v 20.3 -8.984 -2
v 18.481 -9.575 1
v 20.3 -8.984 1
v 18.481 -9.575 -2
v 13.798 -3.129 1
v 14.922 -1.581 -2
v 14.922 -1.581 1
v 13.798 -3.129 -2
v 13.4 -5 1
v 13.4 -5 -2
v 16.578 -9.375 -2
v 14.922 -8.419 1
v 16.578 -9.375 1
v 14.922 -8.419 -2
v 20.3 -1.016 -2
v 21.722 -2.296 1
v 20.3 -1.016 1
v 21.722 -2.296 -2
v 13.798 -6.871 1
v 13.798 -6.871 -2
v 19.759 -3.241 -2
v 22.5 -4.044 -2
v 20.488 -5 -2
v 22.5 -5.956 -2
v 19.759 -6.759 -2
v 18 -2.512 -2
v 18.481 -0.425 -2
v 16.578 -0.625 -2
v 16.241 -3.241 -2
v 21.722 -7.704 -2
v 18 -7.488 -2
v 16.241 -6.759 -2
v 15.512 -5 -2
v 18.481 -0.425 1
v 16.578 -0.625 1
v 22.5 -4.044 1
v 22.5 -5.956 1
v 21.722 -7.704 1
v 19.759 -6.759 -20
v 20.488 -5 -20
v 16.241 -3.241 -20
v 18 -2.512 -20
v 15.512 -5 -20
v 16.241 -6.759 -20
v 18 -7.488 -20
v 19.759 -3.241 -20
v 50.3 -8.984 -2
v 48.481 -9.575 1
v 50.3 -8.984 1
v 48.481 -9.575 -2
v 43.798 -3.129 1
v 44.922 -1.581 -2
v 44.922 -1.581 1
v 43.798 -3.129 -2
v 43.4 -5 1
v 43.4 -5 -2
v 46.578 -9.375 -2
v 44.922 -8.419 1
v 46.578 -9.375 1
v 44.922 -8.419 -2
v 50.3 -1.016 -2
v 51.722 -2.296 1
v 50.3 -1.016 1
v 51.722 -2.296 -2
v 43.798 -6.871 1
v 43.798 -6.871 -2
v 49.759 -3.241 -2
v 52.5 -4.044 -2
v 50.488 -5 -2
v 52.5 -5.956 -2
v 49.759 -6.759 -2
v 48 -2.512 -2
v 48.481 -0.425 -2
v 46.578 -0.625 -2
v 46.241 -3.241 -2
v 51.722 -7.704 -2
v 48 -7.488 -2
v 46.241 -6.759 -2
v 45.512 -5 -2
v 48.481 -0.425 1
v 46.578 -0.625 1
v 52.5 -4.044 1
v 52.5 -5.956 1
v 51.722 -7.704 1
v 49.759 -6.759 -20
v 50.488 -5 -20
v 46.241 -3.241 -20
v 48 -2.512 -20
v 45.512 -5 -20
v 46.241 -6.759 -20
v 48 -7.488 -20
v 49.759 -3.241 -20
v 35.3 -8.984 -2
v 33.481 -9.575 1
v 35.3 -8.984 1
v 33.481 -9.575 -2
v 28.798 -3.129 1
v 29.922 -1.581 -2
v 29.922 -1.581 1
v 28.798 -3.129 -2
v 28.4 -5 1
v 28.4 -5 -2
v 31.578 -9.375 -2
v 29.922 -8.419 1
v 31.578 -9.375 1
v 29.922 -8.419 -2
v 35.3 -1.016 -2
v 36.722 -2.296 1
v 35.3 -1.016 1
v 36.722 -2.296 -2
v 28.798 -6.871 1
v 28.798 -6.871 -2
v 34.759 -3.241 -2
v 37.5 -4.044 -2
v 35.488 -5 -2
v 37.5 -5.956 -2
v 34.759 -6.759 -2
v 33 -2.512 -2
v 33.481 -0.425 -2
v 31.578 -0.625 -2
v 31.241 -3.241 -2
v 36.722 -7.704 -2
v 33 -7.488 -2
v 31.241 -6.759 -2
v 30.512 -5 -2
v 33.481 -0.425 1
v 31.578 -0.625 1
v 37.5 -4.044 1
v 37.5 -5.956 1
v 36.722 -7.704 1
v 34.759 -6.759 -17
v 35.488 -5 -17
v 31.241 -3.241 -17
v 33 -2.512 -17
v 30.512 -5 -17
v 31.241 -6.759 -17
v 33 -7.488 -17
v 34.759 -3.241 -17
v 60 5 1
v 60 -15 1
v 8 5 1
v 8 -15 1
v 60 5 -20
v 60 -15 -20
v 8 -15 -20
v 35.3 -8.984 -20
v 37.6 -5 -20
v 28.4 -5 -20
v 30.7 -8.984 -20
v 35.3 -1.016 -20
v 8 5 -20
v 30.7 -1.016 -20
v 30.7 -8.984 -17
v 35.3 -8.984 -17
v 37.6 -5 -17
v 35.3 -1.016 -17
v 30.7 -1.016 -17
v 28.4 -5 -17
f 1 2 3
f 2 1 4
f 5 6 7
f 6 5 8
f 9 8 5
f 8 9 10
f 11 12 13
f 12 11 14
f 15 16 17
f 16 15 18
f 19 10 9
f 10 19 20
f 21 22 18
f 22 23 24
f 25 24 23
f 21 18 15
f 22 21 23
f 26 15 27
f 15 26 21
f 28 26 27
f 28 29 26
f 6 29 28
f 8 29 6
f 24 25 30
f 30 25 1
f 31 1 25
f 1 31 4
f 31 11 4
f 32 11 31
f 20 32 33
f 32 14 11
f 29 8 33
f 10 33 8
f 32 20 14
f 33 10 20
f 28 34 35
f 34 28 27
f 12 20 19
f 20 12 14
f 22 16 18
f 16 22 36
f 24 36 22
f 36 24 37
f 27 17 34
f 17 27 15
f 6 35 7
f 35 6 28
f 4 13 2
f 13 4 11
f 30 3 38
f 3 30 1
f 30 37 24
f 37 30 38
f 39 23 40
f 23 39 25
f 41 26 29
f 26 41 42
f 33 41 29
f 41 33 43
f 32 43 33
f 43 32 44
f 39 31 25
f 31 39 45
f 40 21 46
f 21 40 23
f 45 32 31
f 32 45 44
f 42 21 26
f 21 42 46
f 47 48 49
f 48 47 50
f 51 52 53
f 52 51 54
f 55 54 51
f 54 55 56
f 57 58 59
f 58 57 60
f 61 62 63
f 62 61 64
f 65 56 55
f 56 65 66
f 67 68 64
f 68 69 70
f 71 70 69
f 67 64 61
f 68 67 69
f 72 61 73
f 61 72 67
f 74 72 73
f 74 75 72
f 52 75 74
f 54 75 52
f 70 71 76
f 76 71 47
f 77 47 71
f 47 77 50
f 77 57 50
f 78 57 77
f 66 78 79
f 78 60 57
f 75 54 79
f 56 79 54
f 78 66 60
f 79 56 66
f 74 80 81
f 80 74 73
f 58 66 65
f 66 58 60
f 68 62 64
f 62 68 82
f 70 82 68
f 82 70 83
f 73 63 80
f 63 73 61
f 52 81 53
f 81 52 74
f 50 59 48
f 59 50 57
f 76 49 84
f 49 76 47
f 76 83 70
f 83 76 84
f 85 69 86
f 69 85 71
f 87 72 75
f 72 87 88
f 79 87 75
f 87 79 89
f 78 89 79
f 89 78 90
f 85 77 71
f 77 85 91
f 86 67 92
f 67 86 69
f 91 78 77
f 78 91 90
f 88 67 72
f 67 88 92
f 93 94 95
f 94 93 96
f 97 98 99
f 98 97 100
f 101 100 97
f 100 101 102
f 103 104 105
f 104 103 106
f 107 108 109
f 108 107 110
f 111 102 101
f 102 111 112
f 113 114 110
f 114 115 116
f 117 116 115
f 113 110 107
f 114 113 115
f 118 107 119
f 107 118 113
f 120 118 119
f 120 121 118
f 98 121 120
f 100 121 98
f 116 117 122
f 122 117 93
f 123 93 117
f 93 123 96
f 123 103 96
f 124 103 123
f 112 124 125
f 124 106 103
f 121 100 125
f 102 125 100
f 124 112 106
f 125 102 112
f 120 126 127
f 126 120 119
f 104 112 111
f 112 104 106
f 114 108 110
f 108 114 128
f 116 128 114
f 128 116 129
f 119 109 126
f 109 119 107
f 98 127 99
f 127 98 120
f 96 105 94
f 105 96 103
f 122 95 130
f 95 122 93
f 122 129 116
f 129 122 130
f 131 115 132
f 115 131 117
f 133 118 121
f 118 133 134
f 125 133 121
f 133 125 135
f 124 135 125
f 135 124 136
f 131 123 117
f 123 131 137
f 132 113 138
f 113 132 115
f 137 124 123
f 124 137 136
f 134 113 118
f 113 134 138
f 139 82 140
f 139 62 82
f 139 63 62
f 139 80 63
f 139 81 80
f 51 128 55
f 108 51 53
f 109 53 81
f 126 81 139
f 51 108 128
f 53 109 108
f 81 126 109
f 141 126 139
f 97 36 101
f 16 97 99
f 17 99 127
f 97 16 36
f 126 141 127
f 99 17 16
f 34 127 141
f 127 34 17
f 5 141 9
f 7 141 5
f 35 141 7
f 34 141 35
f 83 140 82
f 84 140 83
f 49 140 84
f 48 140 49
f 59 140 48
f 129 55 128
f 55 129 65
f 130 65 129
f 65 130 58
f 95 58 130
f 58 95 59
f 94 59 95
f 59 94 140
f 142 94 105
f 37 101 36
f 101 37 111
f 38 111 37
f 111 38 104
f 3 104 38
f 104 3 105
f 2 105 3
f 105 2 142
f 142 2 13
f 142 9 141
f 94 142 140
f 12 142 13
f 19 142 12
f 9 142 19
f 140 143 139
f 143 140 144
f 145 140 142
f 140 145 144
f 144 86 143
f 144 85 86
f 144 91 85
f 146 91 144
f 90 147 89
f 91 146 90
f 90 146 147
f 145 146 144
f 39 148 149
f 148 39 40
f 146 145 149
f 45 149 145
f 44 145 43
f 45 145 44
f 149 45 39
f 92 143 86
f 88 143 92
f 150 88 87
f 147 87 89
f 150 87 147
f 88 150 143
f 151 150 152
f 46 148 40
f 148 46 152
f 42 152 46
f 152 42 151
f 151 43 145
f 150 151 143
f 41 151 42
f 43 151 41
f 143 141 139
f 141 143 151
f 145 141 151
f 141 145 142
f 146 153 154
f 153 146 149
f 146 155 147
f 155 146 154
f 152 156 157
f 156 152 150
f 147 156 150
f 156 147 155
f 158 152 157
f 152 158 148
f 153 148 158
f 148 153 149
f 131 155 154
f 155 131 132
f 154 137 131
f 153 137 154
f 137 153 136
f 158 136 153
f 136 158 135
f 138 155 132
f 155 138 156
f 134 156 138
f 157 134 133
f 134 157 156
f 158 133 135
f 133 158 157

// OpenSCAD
// file: MCAD/constants.scad
// MIT license


TAU = 6.2831853071; //2*PI, see http://tauday.com/
PI = TAU/2;

// translates a imperial measurement in inches to meters
mm_per_inch = 25.4;
// file: MCAD/math.scad
// MIT license

include <constants.scad>

function deg(angle) = 360*angle/TAU;
// file: bom.scad
module bom(code, desc, category) {
	echo(str("BOM: ",code," - ", desc, "; ", category));
}
// file: MCAD/shapes.scad
/*
 *  OpenSCAD Shapes Library (www.openscad.org)
 *  Copyright (C) 2009  Catarina Mota
 *  Copyright (C) 2010  Elmo Mäntynen
 *
 *  License: LGPL 2.1 or later
*/

// 2D Shapes
//ngon(sides, radius, center=false);

// 3D Shapes
//box(width, height, depth);
//roundedBox(width, height, depth, factor);
//cone(height, radius);
//ellipticalCylinder(width, height, depth);
//ellipsoid(width, height);
//tube(height, radius, wall, center = false);
//tube2(height, ID, OD, center = false);
//ovalTube(width, height, depth, wall, center = false);
//hexagon(height, depth);
//octagon(height, depth);
//dodecagon(height, depth);
//hexagram(height, depth);
//rightTriangle(adjacent, opposite, depth);
//equiTriangle(side, depth);
//12ptStar(height, depth);

//----------------------

// size is a vector [w, h, d]
module box(width, height, depth) {
  cube([width, height, depth], true);
}

// size is a vector [w, h, d]
module roundedBox(width, height, depth, radius) {
  size=[width, height, depth];
  cube(size - [2*radius,0,0], true);
  cube(size - [0,2*radius,0], true);
  for (x = [radius-size[0]/2, -radius+size[0]/2],
       y = [radius-size[1]/2, -radius+size[1]/2]) {
    translate([x,y,0]) cylinder(r=radius, h=size[2], center=true);
  }
}

module cone(height, radius, center = false) {
  cylinder(height, radius, 0, center);
}

module ellipticalCylinder(w,h, height, center = false) {
  scale([1, h/w, 1]) cylinder(h=height, r=w, center=center);
}

module ellipsoid(w, h, center = false) {
  scale([1, h/w, 1]) sphere(r=w/2, center=center);
}

// wall is wall thickness
module tube(height, radius, wall, center = false) {
  difference() {
    cylinder(h=height, r=radius, center=center);
    cylinder(h=height, r=radius-wall, center=center);
  }
}

// wall is wall thickness
module tube2(height, ID, OD, center = false) {
  difference() {
    cylinder(h=height, r=OD/2, center=center);
    cylinder(h=height, r=ID/2, center=center);
  }
}

// wall is wall thickness
module ovalTube(height, rx, ry, wall, center = false) {
  difference() {
    scale([1, ry/rx, 1]) cylinder(h=height, r=rx, center=center);
    scale([(rx-wall)/rx, (ry-wall)/rx, 1]) cylinder(h=height, r=rx, center=center);
  }
}

// size is the XY plane size, height in Z
module hexagon(size, height) {
  boxWidth = size/1.75;
  for (r = [-60, 0, 60]) rotate([0,0,r]) cube([boxWidth, size, height], true);
}

// size is the XY plane size, height in Z
module octagon(size, height) {
  intersection() {
    cube([size, size, height], true);
    rotate([0,0,45]) cube([size, size, height], true);
  }
}

// size is the XY plane size, height in Z
module dodecagon(size, height) {
  intersection() {
    hexagon(size, height);
    rotate([0,0,90]) hexagon(size, height);
  }
}

// size is the XY plane size, height in Z
module hexagram(size, height) {
  boxWidth=size/1.75;
  for (v = [[0,1],[0,-1],[1,-1]]) {
    intersection() {
      rotate([0,0,60*v[0]]) cube([size, boxWidth, height], true);
      rotate([0,0,60*v[1]]) cube([size, boxWidth, height], true);
    }
  }
}

module rightTriangle(adjacent, opposite, height) {
  difference() {
    translate([-adjacent/2,opposite/2,0]) cube([adjacent, opposite, height], true);
    translate([-adjacent,0,0]) {
      rotate([0,0,atan(opposite/adjacent)]) dislocateBox(adjacent*2, opposite, height+2);
    }
  }
}

module equiTriangle(side, height) {
  difference() {
    translate([-side/2,side/2,0]) cube([side, side, height], true);
    rotate([0,0,30]) dislocateBox(side*2, side, height);
    translate([-side,0,0]) {
      rotate([0,0,60]) dislocateBox(side*2, side, height);
    }
  }
}

module 12ptStar(size, height) {
  starNum = 3;
  starAngle = 360/starNum;
  for (s = [1:starNum]) {
    rotate([0, 0, s*starAngle]) cube([size, size, height], true);
  }
}

//-----------------------
//MOVES THE ROTATION AXIS OF A BOX FROM ITS CENTER TO THE BOTTOM LEFT CORNER
module dislocateBox(w, h, d) {
  translate([0,0,-d/2]) cube([w,h,d]);
}

//-----------------------
// Tests
//module test2D_ellipse(){ellipse(10, 5);}
module test_ellipsoid(){ellipsoid(10, 5);}

//module test2D_egg_outline(){egg_outline();}
// file: MCAD/motors.scad
// Copyright 2010 D1plo1d

// This library is dual licensed under the GPL 3.0 and the GNU Lesser General Public License as per http://creativecommons.org/licenses/LGPL/2.1/ .

include <math.scad>


//generates a motor mount for the specified nema standard #.
module stepper_motor_mount(nema_standard,slide_distance=0, mochup=true, tolerance=0) {
	//dimensions from:
	// http://www.numberfactory.com/NEMA%20Motor%20Dimensions.htm
	if (nema_standard == 17)
	{
		_stepper_motor_mount(
			motor_shaft_diameter = 0.1968*mm_per_inch,
			motor_shaft_length = 0.945*mm_per_inch,
			pilot_diameter = 0.866*mm_per_inch,
			pilot_length = 0.80*mm_per_inch,
			mounting_bolt_circle = 1.725*mm_per_inch,
			bolt_hole_size = 3.5,
			bolt_hole_distance = 1.220*mm_per_inch,
			slide_distance = slide_distance,
			mochup = mochup,
			tolerance=tolerance);
	}
	if (nema_standard == 23)
	{
		_stepper_motor_mount(
			motor_shaft_diameter = 0.250*mm_per_inch,
			motor_shaft_length = 0.81*mm_per_inch,
			pilot_diameter = 1.500*mm_per_inch,
			pilot_length = 0.062*mm_per_inch,
			mounting_bolt_circle = 2.625*mm_per_inch,
			bolt_hole_size = 0.195*mm_per_inch,
			bolt_hole_distance = 1.856*mm_per_inch,
			slide_distance = slide_distance,
			mochup = mochup,
			tolerance=tolerance);
	}
	
}


//inner mehod for creating a stepper motor mount of any dimensions
module _stepper_motor_mount(
	motor_shaft_diameter,
	motor_shaft_length,
	pilot_diameter,
	pilot_length,
	mounting_bolt_circle,
	bolt_hole_size,
	bolt_hole_distance,
	slide_distance = 0,
	motor_length = 40, //arbitray - not standardized
	mochup,
	tolerance = 0
)
{
	union()
	{
	// == centered mount points ==
	//mounting circle inset
	translate([0,slide_distance/2,0]) circle(r = pilot_diameter/2 + tolerance);
	square([pilot_diameter,slide_distance],center=true);
	translate([0,-slide_distance/2,0]) circle(r = pilot_diameter/2 + tolerance);

	//todo: motor shaft hole
	
	//mounting screw holes
	for (x = [-1,1])
	{
		for (y = [-1,1])
		{
			translate([x*bolt_hole_distance/2,y*bolt_hole_distance/2,0])
			{
				translate([0,slide_distance/2,0]) circle(bolt_hole_size/2 + tolerance);
				translate([0,-slide_distance/2,0]) circle(bolt_hole_size/2 + tolerance);
				square([bolt_hole_size+2*tolerance,slide_distance],center=true);
			}
		}
	}
	// == motor mock-up ==
	//motor box
	if (mochup == true)
	{
		%translate([0,0,-5]) cylinder(h = 5, r = pilot_diameter/2);
		%translate(v=[0,0,-motor_length/2])
		{
			cube(size=[bolt_hole_distance+bolt_hole_size+5,bolt_hole_distance+bolt_hole_size+5,motor_length], center = true);
		}
		//shaft
		%translate(v=[0,0,-(motor_length-motor_shaft_length-2)/2])
		{
			%cylinder(r=motor_shaft_diameter/2,h=motor_length+motor_shaft_length--1, center = true);
		}
	}
	}
}
// file: MCAD/materials.scad
/*
 * Material colors.
 * 
 * Originally by Hans Häggström, 2010.
 * Dual licenced under Creative Commons Attribution-Share Alike 3.0 and LGPL2 or later
 */

// Material colors
Oak = [0.65, 0.5, 0.4];
Pine = [0.85, 0.7, 0.45];
Birch = [0.9, 0.8, 0.6];
FiberBoard = [0.7, 0.67, 0.6];
BlackPaint = [0.2, 0.2, 0.2];
Iron = [0.36, 0.33, 0.33];
Steel = [0.65, 0.67, 0.72];
Stainless = [0.45, 0.43, 0.5];
Aluminum = [0.77, 0.77, 0.8];
Brass = [0.88, 0.78, 0.5];
Transparent = [1, 1, 1, 0.2];

// Example, uncomment to view
//color_demo();

module color_demo(){
    // Wood
    colorTest(Oak, 0, 0);
    colorTest(Pine, 1, 0);
    colorTest(Birch, 2, 0);

    // Metals
    colorTest(Iron, 0, 1);
    colorTest(Steel, 1, 1);
    colorTest(Stainless, 2, 1);
    colorTest(Aluminum, 3, 1);

    // Mixboards
    colorTest(FiberBoard, 0, 2);

    // Paints
    colorTest(BlackPaint, 0, 3);
}

module colorTest(col, row=0, c=0) {
  color(col) translate([row * 30,c*30,0]) sphere(r=10);
}
// file: MCAD/units.scad
/*
 * Basic units.
 * 
 * Originally by Hans Häggström, 2010.
 * Dual licenced under Creative Commons Attribution-Share Alike 3.0 and LGPL2 or later
 */


mm = 1;
cm = 10 * mm;
dm = 100 * mm;
m = 1000 * mm;

inch = 25.4 * mm;

X = [1, 0, 0];
Y = [0, 1, 0];
Z = [0, 0, 1];

M3 = 3*mm;
M4 = 4*mm;
M5 = 5*mm;
M6 = 6*mm;
M8 = 8*mm;


// When a small distance is needed to overlap shapes for boolean cutting, etc.
epsilon = 0.01*mm;
// file: vslot.scad
include <MCAD/units.scad>;
include <MCAD/materials.scad>
use <MCAD/shapes.scad>;
use <bom.scad>;

vslot_color_black = [0.27, 0.27, 0.3];
vslot_color = Aluminum;

module vslot(length=50, sections=1, finish, cutout=0) {
	size = sections * 20;
	bom(str("vslot20x", size, "x", length), str("v-slot 20x", size, " (", length , "mm)"), ["rail", "extrusion", "structure"]);
	cutext = [[12.00,4.50],[10.00,4.50],[8.20,2.78],[8.20,5.50],[6.56,5.50],[3.90,2.84],[3.90,0.21],[3.69,0.00],[3.90,-0.21],[3.90,-2.84],[6.56,-5.50],[8.20,-5.50],[8.20,-2.78],[10.00,-4.50],[12.00,-4.50]];
	cutint = [[16.10,0.21],[16.10,2.84],[12.70,6.24],[12.70,8.78],[7.30,8.78],[7.30,6.24],[3.90,2.84],[3.90,0.21],[3.69,0.00],[3.90,-0.21],[3.90,-2.84],[7.30,-6.24],[7.30,-8.78],[12.70,-8.78],[12.70,-6.24],[16.10,-2.84],[16.10,-0.21],[16.31,0.00],];
	cutcorner = [[8.20,8.20],[6.57,8.20],[6.57,7.66],[7.66,6.57],[8.20,6.57]];

	module profile() {
        
		difference() {
         
			translate([0,0,length/2])
			roundedBox(20 * sections, 20, length, 1.5);
         if (cutout == 0){
			for(i = [0,180]) rotate([0,0,-i]) translate([10 * (sections - 1), 0, -epsilon/2]) {
				linear_extrude(length+20) polygon(cutext);
				translate([5,-2.89,-20]) cube([10,5.78,length+40]);
			}
          
			for(i = [90,270]) rotate([0,0,-i])
				for(j = [0:sections-1]) translate([0, (sections - 1) * 10 - 20 * j, -epsilon/2]) {
					linear_extrude(length+epsilon) polygon(cutext);
					translate([5,-2.89,-20]) cube([10,5.78,length+40]);
				}

			for(i = [0:sections-1]) translate([i * 20 - 10 * (sections - 1),0,-epsilon/2])
				cylinder(length+20, 2.1, 2.1);

			for(i = [90,270]) rotate([0,0,-i])
				translate([0,(sections - 1) * 10,-epsilon/2])
				linear_extrude(length+epsilon) polygon(cutcorner);
			for(i = [ 0,180]) rotate([0,0,-i])
				translate([(sections - 1) * 10,0,-epsilon/2])
				linear_extrude(length+epsilon) polygon(cutcorner);

			if(sections > 1)
				for(i = [0:sections-2]) translate([(sections - 3) * 10 - i * 20, 0, -epsilon/2])
					linear_extrude(length+epsilon) polygon(cutint);
                      }
		}
	}

      if (cutout == 1){
		 translate([0,0,length/2]) box(20 * sections, 20.2, length);
          } else {
	     if(finish)
		   color(finish) profile();
	     else
		   color(vslot_color) profile();
         }
}

module vslot20x20(length, finish) { vslot(length, 1, finish); }
module vslot20x20_cutout(length, finish) { vslot(length, 1, finish, 1); }


module vslot20x40(length, finish) { vslot(length, 2, finish); }
module vslot20x40_cutout(length, finish) { vslot(length, 2, finish, 1); }

module vslot20x60(length, finish) { vslot(length, 3, finish); }
module vslot20x60_cutout(length, finish) { vslot(length, 3, finish, 1); }

module vslot20x80(length, finish) { vslot(length, 4, finish); }
module vslot20x80_cutout(length, finish) { vslot(length, 4, finish, 1); }


module vslot_test() {
	$fn = 32;

	vslot20x20(100);

	translate([0, 40, 0])
	vslot20x40(100, vslot_color_black);

	translate([0, 80, 0])
	vslot20x60(100);

	translate([0, 120, 0])
	vslot20x80(100, vslot_color_black);

    translate([0,140,0]) vslot20x20_cutout(100);
}

vslot_test();
// file: MCAD/nuts_and_bolts.scad
// Copyright 2010 D1plo1d

// This library is dual licensed under the GPL 3.0 and the GNU Lesser General Public License as per http://creativecommons.org/licenses/LGPL/2.1/ .

//testNutsAndBolts();

module SKIPtestNutsAndBolts()
{
	$fn = 360;
	translate([0,15])nutHole(3, proj=2);
	boltHole(3, length= 30, proj=2);
}

MM = "mm";
INCH = "inch"; //Not yet supported

//Based on: http://www.roymech.co.uk/Useful_Tables/Screws/Hex_Screws.htm
METRIC_NUT_AC_WIDTHS =
[
	-1, //0 index is not used but reduces computation
	-1,
	-1,
	6.40,//m3
	8.10,//m4
	9.20,//m5
	11.50,//m6
	-1,
	15.00,//m8
	-1,
	19.60,//m10
	-1,
	22.10,//m12
	-1,
	-1,
	-1,
	27.70,//m16
	-1,
	-1,
	-1,
	34.60,//m20
	-1,
	-1,
	-1,
	41.60,//m24
	-1,
	-1,
	-1,
	-1,
	-1,
	53.1,//m30
	-1,
	-1,
	-1,
	-1,
	-1,
	63.5//m36
];
METRIC_NUT_THICKNESS =
[
	-1, //0 index is not used but reduces computation
	-1,
	-1,
	2.40,//m3
	3.20,//m4
	4.00,//m5
	5.00,//m6
	-1,
	6.50,//m8
	-1,
	8.00,//m10
	-1,
	10.00,//m12
	-1,
	-1,
	-1,
	13.00,//m16
	-1,
	-1,
	-1,
	16.00//m20
	-1,
	-1,
	-1,
	19.00,//m24
	-1,
	-1,
	-1,
	-1,
	-1,
	24.00,//m30
	-1,
	-1,
	-1,
	-1,
	-1,
	29.00//m36
];

COURSE_METRIC_BOLT_MAJOR_THREAD_DIAMETERS =
[//based on max values
	-1, //0 index is not used but reduces computation
	-1,
	-1,
	2.98,//m3
	3.978,//m4
	4.976,//m5
	5.974,//m6
	-1,
	7.972,//m8
	-1,
	9.968,//m10
	-1,
	11.966,//m12
	-1,
	-1,
	-1,
	15.962,//m16
	-1,
	-1,
	-1,
	19.958,//m20
	-1,
	-1,
	-1,
	23.952,//m24
	-1,
	-1,
	-1,
	-1,
	-1,
	29.947,//m30
	-1,
	-1,
	-1,
	-1,
	-1,
	35.940//m36
];

module nutHole(size, units=MM, tolerance = +0.0001, proj = -1)
{
	//takes a metric screw/nut size and looksup nut dimensions
	radius = METRIC_NUT_AC_WIDTHS[size]/2+tolerance;
	height = METRIC_NUT_THICKNESS[size]+tolerance;
	if (proj == -1)
	{
		cylinder(r= radius, h=height, $fn = 6, center=[0,0]);
	}
	if (proj == 1)
	{
		circle(r= radius, $fn = 6);
	}
	if (proj == 2)
	{
		translate([-radius/2, 0])
			square([radius*2, height]);
	}
}

module boltHole(size, units=MM, length, tolerance = +0.0001, proj = -1)
{
	radius = COURSE_METRIC_BOLT_MAJOR_THREAD_DIAMETERS[size]/2+tolerance;
//TODO: proper screw cap values
	capHeight = METRIC_NUT_THICKNESS[size]+tolerance; //METRIC_BOLT_CAP_HEIGHTS[size]+tolerance;
	capRadius = METRIC_NUT_AC_WIDTHS[size]/2+tolerance; //METRIC_BOLT_CAP_RADIUS[size]+tolerance;

	if (proj == -1)
	{
	translate([0, 0, -capHeight])
		cylinder(r= capRadius, h=capHeight);
	cylinder(r = radius, h = length);
	}
	if (proj == 1)
	{
		circle(r = radius);
	}
	if (proj == 2)
	{
		translate([-capRadius/2, -capHeight])
			square([capRadius*2, capHeight]);
		square([radius*2, length]);
	}
}
// file: nemamount.scad
include <MCAD/units.scad>;
include <MCAD/materials.scad>
include <MCAD/stepper.scad>
include <MCAD/motors.scad>
use <MCAD/shapes.scad>;
$fn = 32;




module motor_support(ht)
{
   difference(){
	  translate([-22.5,23.5,0]) rotate([90,0,0]) motor_support_body(ht);
      translate([0,1,0]) rotate([90,0,0]) motor_support_cuts(ht);
      }
}

module motor_support_body(ht)
{
	cube([45,ht,48.5]);

}


module motor_support_cuts(ht)
{
// Motor shaft/pulley cutout.
      translate([0,.1,0]) rotate([90, 0, 0]) cylinder(r=12, h=ht*2, center=true, $fn=60);
      // NEMA 17 stepper motor mounting screws.
      for (x = [-1, 1]) for (z = [-1, 1]) {
        scale([x, 1, z]) translate([15.5, .1, 15.5]) {
          rotate([90, 0, 0]) cylinder(r=4, h=ht*2, center=true, $fn=12);
          }
        }
}



module nema_geared_cutout()
{
    //pulley opening
    translate([16,1,21]) rotate([90,0,0]){
      cylinder (h=22, r=6.6);

      rotate([0,0,45]) {
        translate([14,0,0]) cylinder(h=22, r=1.6, $fn=12);
        translate([0,14,0]) cylinder(h=22, r=1.6, $fn=12);
        translate([-14,0,0]) cylinder(h=22, r=1.6, $fn=12);
        translate([0,-14,0]) cylinder(h=22, r=1.6, $fn=12);
      }
     
    }

    //gearhead indentation
    translate([16,-5,21]) rotate([90,0,0]) cylinder (h=3.35, r=11.25);

  
    
}

module nema_cutout()
{
// Motor shaft/pulley cutout.
      rotate([90, 0, 0]) cylinder(r=12, h=20, center=true, $fn=60);
      // NEMA 17 stepper motor mounting screws.
      for (x = [-1, 1]) for (z = [-1, 1]) {
        scale([x, 1, z]) translate([15.5, -5, 15.5]) {
          rotate([90, 0, 0]) cylinder(r=1.65, h=20, center=true, $fn=12);
          }
        }
}

module nema_motor()
{
   union(){
     nema_mount();
     %translate([0,-4,1]) rotate([90,0,0]) motor(Nema17, size=NemaLong , dualAxis=false);
     }
}

module nema_motor_inverse()
{
   union(){
     nema_mount_inverse();
     %translate([0,-4,1]) rotate([90,0,0]) motor(Nema17, size=NemaLong , dualAxis=false);
     }
}

module nema_geared_motor_inverse()
{
   union(){
     nema_geared_inverse();
     %translate([16,-7,22]) rotate([90,0,180]) motor(Nema17, NemaLong, dualAxis=false);
    
     }
}

module nema_geared_motor()
{
   union(){
     nema_geared_mount();
     %translate([16,-7,22]) rotate([90,0,180]) motor(Nema17, NemaLong, dualAxis=false);
    
     }
}

module nema_geared_mount()
{
   difference(){
      union(){
           translate([-6,-6,0]) rotate([90,0,0]) cube([45,45,7]);
           translate([-6,-13,-4]) rotate([0,0,0]) cube([45,25,5]);
           translate([-6,-13,44]) rotate([0,0,0]) cube([45,25,5]);
           }
      translate([0,0,1]) nema_geared_cutout();
      }


}

module nema_geared_inverse()
{
   difference(){
      union(){
           translate([-6,-6,0]) rotate([90,0,0]) cube([45,45,7]);
           translate([-6,-31,-4]) rotate([0,0,0]) cube([45,25,5]);
           translate([-6,-31,44]) rotate([0,0,0]) cube([45,25,5]);
           }
      translate([0,0,1]) nema_geared_cutout();
      }


}

module nema_mount_inverse()
{
   difference(){
      union(){
        translate([-22.5,0,-21.5]) rotate([90,0,0]) cube([45,45,5]);
        translate([-22.5,-5,-25]) rotate([0,0,0]) cube([45,25,5]);
        }
      translate([0,0,1]) nema_cutout();
      }
   //nema_cutout();
}

module nema_mount()
{
   difference(){
      union(){
        translate([-22.5,0,-21.5]) rotate([90,0,0]) cube([45,45,5]);
        translate([-22.5,-25,-25]) rotate([0,0,0]) cube([45,25,5]);
        }
      translate([0,0,1]) nema_cutout();
      }
   //nema_cutout();
}

//nema_motor_inverse();
translate([0,0,40]) rotate([270,0,0]) nema_motor();
translate([0,0,0]) motor_support(40);
//nema_geared_motor();
//nema_geared_motor_inverse();
// file: mountblock.scad
use <vslot.scad>;
use <MCAD/nuts_and_bolts.scad>;


module mountblock_body()
{
	cube([40,40,20]);
	translate([20,20,0]) %vslot20x20(200);
     %translate([37,20,10]) rotate([90,0,270]) boltHole(5, length=18);
     %translate([3,20,10]) rotate([90,0,90]) boltHole(5, length=18);
}


module mountblock_cuts()
{
	translate([20,20,-0.2]) vslot20x20_cutout(80.1);
    translate([37,20,10]) rotate([90,0,270]) boltHole(5, length=18);
    translate([3,20,10]) rotate([90,0,90]) boltHole(5, length=18);
}


module mountblock()
{
	difference(){
         mountblock_body();
         mountblock_cuts();
         }

}


mountblock();
// main file
use <mountblock.scad>;
use <nemamount.scad>;
use <MCAD/nuts_and_bolts.scad>;

module spacerblock()
{
   // %translate([18,-5,-2]) rotate([0,180,0]) boltHole(5, length=20);
   // %translate([48,-5,-2]) rotate([0,180,0]) boltHole(5, length=20);
   // %translate([33,-5,-17]) rotate([0,0,0]) boltHole(5,length=30);
   // %translate([33,-5,-21]) nutHole(5);
	difference(){
        translate([60,5,-20]) rotate([180,180,0]) cube([52,20,21]);
        translate([18,-5,-2]) rotate([0,180,0]) boltHole(5, length=20);
        translate([48,-5,-2]) rotate([0,180,0]) boltHole(5, length=20);
        translate([33,-5,-2]) rotate([0,180,0]) boltHole(5, length=20);
        translate([48,-105,-2]) nutHole(5);
        translate([33,-5,-17]) rotate([0,180,0]) cylinder(r=3,length=30);
        translate([33,-5,-21]) nutHole(5);
        }
}

spacerblock();
